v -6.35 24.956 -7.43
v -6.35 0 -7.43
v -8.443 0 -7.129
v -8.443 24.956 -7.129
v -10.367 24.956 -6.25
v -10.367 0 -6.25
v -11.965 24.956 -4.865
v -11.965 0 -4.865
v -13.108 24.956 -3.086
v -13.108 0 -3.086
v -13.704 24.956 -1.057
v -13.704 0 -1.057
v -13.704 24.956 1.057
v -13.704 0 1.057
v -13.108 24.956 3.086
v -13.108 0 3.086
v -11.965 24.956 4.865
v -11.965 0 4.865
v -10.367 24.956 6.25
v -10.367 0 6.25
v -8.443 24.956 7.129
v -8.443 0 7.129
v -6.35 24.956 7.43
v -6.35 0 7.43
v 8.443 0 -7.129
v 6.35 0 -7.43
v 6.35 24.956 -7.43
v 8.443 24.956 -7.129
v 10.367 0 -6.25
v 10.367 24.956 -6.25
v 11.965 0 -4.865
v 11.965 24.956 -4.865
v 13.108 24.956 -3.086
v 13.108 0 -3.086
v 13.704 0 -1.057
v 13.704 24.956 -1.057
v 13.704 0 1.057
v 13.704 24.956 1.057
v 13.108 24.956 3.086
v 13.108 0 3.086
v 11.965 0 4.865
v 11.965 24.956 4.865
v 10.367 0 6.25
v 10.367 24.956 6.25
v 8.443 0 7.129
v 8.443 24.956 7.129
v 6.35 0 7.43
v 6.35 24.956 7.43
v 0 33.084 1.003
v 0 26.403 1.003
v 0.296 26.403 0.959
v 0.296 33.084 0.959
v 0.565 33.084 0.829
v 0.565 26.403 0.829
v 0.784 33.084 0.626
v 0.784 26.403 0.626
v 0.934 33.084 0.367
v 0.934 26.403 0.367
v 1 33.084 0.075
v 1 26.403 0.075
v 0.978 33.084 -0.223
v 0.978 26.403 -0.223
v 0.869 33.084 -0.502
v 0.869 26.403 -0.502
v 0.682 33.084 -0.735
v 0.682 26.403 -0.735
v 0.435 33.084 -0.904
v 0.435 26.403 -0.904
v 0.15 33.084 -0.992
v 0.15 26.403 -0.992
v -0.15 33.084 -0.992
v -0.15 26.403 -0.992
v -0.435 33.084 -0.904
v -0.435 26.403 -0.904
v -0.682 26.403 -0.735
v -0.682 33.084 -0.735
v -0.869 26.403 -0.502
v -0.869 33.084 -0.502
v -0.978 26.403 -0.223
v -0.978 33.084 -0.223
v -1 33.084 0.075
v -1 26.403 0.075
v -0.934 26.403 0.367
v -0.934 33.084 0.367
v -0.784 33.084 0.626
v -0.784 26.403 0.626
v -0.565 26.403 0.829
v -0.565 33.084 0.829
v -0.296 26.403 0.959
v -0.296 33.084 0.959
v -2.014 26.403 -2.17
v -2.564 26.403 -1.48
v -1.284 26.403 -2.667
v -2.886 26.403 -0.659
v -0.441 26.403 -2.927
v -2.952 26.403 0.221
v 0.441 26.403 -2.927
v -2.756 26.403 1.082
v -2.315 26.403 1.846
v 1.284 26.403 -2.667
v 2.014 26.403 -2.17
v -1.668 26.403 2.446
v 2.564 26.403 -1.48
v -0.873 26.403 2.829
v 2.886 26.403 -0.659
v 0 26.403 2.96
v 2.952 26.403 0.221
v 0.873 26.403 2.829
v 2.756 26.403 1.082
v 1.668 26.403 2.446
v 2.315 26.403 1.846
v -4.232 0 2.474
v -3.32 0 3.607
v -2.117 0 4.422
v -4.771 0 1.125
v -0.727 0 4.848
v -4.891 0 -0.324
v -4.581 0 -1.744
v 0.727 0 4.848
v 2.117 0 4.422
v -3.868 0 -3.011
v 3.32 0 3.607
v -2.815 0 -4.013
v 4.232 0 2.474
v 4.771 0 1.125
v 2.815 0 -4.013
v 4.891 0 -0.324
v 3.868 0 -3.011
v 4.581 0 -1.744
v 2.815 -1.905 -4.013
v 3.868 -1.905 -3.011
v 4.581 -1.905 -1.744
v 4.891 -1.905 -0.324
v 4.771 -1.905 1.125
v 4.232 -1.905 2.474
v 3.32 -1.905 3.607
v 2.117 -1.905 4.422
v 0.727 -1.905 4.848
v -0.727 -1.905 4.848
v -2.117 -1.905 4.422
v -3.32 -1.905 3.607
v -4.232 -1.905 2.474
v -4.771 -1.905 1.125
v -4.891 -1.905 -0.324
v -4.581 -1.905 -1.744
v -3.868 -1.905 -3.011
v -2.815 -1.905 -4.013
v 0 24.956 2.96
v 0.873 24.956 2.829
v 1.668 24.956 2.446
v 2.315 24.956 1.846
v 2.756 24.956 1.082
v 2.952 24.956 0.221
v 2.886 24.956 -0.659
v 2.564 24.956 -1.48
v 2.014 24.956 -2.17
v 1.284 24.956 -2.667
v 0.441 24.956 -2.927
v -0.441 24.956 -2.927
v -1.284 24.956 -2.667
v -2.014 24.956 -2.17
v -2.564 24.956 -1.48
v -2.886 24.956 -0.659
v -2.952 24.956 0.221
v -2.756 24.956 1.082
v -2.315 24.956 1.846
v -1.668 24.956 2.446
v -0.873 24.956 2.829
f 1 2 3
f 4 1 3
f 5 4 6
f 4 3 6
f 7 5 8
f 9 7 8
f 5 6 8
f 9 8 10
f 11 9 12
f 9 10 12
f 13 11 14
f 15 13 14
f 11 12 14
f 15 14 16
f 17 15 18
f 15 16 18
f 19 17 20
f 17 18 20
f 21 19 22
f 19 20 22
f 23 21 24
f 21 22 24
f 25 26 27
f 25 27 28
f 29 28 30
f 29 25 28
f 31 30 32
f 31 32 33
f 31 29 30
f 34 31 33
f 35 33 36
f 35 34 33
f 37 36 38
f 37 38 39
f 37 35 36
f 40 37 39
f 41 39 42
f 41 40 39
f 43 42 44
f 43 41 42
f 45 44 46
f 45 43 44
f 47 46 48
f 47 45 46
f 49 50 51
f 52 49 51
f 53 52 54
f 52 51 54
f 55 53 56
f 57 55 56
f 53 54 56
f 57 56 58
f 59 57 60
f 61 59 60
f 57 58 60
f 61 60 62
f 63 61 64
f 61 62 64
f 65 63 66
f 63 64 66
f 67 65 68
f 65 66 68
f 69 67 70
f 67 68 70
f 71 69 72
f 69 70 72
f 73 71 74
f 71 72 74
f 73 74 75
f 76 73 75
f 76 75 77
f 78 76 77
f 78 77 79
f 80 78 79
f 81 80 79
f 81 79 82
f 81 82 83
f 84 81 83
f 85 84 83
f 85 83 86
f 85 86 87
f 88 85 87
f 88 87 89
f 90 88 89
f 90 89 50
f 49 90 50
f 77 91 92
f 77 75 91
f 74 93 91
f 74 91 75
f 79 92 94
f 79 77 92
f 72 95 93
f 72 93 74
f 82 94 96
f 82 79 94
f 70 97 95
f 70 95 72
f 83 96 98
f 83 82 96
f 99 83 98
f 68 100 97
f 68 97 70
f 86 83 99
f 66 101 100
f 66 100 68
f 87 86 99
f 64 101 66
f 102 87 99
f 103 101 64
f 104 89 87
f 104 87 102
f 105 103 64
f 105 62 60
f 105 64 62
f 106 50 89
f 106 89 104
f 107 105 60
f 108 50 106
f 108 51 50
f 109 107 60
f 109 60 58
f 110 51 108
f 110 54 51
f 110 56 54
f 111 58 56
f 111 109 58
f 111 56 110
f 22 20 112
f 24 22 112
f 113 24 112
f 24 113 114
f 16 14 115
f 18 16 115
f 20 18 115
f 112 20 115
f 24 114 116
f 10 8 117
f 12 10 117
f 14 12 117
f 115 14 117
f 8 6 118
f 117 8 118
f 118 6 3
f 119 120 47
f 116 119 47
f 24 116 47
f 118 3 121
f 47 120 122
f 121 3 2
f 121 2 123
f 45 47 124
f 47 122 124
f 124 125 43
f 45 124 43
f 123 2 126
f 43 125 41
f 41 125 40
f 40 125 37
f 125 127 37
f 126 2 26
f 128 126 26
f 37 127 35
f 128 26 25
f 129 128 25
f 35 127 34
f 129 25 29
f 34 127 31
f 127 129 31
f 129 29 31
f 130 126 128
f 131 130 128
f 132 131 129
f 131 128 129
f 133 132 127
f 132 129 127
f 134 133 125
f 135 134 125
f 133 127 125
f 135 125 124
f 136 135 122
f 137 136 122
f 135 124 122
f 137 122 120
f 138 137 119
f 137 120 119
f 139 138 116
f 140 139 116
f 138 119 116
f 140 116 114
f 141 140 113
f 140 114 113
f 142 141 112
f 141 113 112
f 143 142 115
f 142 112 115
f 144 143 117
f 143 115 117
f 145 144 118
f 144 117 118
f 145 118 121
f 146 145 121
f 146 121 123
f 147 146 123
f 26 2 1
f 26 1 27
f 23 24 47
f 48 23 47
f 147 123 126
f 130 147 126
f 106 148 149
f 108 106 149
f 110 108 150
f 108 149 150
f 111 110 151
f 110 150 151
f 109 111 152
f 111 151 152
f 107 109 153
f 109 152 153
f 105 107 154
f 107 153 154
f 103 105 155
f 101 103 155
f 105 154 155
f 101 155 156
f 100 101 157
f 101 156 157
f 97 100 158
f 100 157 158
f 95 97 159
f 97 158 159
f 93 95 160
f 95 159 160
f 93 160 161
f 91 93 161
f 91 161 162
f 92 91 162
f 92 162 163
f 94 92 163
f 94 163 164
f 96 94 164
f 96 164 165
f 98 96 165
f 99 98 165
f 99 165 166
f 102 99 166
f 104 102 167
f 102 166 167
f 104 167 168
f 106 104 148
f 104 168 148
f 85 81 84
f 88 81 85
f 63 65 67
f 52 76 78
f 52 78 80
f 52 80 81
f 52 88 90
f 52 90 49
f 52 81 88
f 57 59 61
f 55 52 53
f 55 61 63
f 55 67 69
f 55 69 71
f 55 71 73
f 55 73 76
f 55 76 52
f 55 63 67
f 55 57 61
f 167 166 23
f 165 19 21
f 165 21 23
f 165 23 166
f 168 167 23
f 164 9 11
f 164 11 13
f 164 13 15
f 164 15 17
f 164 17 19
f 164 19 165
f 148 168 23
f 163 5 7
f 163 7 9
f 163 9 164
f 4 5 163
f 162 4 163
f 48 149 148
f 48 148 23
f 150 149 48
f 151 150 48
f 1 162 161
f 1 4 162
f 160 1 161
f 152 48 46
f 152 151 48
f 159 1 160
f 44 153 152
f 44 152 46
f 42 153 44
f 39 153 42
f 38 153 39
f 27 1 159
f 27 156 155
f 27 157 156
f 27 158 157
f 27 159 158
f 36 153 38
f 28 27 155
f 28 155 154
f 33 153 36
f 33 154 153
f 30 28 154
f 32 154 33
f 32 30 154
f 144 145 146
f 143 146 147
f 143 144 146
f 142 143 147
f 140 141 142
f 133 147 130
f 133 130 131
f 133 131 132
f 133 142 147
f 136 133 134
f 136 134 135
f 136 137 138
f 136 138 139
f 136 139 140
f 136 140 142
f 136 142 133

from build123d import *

# Parameters (mm, degrees)
BOSS_EXTRUDE1_DEPTH = 24.9555
SKETCH2_R           = 2.96037
SKETCH2_R_2         = 1.0033
BOSS_EXTRUDE2_DEPTH = 1.4478
SKETCH2_3_R         = 1.0033
BOSS_EXTRUDE3_DEPTH = 8.128
BOSS_EXTRUDE4_DEPTH = 1.905


with BuildPart() as part:
    # Sketch1 → Boss-Extrude1 (new body)
    with BuildSketch(Plane(origin=(0, 0, 0), x_dir=(1, 0, 0), z_dir=(0, 1, 0))):
        with BuildLine():
            Line((6.35, 7.4295), (-6.35, 7.4295))
            ThreePointArc((-6.35, 7.4295), (-13.7795, 0), (-6.35, -7.4295))
            Line((-6.35, -7.4295), (6.35, -7.4295))
            ThreePointArc((6.35, -7.4295), (13.7795, 0), (6.35, 7.4295))
        make_face()
    extrude(amount=BOSS_EXTRUDE1_DEPTH)

    # Sketch2 → Boss-Extrude2 (add)
    with BuildSketch(Plane(origin=(0, 24.9555, 0), x_dir=(1, 0, 0), z_dir=(0, 1, 0))):
        Circle(SKETCH2_R)
        Circle(SKETCH2_R_2, mode=Mode.SUBTRACT)
    extrude(amount=BOSS_EXTRUDE2_DEPTH)

    # Sketch2<3> → Boss-Extrude3 (add)
    with BuildSketch(Plane(origin=(0, 24.9555, 0), x_dir=(1, 0, 0), z_dir=(0, 1, 0))):
        Circle(SKETCH2_3_R)
    extrude(amount=BOSS_EXTRUDE3_DEPTH)

    # Sketch3 → Boss-Extrude4 (add)
    with BuildSketch(Plane.XZ):
        with BuildLine():
            Line((-2.815278068, -4.0132), (2.815278068, -4.0132))
            ThreePointArc((2.815278068, -4.0132), (0, 4.9022), (-2.815278068, -4.0132))
        make_face()
    extrude(amount=BOSS_EXTRUDE4_DEPTH)


solid = part.part
